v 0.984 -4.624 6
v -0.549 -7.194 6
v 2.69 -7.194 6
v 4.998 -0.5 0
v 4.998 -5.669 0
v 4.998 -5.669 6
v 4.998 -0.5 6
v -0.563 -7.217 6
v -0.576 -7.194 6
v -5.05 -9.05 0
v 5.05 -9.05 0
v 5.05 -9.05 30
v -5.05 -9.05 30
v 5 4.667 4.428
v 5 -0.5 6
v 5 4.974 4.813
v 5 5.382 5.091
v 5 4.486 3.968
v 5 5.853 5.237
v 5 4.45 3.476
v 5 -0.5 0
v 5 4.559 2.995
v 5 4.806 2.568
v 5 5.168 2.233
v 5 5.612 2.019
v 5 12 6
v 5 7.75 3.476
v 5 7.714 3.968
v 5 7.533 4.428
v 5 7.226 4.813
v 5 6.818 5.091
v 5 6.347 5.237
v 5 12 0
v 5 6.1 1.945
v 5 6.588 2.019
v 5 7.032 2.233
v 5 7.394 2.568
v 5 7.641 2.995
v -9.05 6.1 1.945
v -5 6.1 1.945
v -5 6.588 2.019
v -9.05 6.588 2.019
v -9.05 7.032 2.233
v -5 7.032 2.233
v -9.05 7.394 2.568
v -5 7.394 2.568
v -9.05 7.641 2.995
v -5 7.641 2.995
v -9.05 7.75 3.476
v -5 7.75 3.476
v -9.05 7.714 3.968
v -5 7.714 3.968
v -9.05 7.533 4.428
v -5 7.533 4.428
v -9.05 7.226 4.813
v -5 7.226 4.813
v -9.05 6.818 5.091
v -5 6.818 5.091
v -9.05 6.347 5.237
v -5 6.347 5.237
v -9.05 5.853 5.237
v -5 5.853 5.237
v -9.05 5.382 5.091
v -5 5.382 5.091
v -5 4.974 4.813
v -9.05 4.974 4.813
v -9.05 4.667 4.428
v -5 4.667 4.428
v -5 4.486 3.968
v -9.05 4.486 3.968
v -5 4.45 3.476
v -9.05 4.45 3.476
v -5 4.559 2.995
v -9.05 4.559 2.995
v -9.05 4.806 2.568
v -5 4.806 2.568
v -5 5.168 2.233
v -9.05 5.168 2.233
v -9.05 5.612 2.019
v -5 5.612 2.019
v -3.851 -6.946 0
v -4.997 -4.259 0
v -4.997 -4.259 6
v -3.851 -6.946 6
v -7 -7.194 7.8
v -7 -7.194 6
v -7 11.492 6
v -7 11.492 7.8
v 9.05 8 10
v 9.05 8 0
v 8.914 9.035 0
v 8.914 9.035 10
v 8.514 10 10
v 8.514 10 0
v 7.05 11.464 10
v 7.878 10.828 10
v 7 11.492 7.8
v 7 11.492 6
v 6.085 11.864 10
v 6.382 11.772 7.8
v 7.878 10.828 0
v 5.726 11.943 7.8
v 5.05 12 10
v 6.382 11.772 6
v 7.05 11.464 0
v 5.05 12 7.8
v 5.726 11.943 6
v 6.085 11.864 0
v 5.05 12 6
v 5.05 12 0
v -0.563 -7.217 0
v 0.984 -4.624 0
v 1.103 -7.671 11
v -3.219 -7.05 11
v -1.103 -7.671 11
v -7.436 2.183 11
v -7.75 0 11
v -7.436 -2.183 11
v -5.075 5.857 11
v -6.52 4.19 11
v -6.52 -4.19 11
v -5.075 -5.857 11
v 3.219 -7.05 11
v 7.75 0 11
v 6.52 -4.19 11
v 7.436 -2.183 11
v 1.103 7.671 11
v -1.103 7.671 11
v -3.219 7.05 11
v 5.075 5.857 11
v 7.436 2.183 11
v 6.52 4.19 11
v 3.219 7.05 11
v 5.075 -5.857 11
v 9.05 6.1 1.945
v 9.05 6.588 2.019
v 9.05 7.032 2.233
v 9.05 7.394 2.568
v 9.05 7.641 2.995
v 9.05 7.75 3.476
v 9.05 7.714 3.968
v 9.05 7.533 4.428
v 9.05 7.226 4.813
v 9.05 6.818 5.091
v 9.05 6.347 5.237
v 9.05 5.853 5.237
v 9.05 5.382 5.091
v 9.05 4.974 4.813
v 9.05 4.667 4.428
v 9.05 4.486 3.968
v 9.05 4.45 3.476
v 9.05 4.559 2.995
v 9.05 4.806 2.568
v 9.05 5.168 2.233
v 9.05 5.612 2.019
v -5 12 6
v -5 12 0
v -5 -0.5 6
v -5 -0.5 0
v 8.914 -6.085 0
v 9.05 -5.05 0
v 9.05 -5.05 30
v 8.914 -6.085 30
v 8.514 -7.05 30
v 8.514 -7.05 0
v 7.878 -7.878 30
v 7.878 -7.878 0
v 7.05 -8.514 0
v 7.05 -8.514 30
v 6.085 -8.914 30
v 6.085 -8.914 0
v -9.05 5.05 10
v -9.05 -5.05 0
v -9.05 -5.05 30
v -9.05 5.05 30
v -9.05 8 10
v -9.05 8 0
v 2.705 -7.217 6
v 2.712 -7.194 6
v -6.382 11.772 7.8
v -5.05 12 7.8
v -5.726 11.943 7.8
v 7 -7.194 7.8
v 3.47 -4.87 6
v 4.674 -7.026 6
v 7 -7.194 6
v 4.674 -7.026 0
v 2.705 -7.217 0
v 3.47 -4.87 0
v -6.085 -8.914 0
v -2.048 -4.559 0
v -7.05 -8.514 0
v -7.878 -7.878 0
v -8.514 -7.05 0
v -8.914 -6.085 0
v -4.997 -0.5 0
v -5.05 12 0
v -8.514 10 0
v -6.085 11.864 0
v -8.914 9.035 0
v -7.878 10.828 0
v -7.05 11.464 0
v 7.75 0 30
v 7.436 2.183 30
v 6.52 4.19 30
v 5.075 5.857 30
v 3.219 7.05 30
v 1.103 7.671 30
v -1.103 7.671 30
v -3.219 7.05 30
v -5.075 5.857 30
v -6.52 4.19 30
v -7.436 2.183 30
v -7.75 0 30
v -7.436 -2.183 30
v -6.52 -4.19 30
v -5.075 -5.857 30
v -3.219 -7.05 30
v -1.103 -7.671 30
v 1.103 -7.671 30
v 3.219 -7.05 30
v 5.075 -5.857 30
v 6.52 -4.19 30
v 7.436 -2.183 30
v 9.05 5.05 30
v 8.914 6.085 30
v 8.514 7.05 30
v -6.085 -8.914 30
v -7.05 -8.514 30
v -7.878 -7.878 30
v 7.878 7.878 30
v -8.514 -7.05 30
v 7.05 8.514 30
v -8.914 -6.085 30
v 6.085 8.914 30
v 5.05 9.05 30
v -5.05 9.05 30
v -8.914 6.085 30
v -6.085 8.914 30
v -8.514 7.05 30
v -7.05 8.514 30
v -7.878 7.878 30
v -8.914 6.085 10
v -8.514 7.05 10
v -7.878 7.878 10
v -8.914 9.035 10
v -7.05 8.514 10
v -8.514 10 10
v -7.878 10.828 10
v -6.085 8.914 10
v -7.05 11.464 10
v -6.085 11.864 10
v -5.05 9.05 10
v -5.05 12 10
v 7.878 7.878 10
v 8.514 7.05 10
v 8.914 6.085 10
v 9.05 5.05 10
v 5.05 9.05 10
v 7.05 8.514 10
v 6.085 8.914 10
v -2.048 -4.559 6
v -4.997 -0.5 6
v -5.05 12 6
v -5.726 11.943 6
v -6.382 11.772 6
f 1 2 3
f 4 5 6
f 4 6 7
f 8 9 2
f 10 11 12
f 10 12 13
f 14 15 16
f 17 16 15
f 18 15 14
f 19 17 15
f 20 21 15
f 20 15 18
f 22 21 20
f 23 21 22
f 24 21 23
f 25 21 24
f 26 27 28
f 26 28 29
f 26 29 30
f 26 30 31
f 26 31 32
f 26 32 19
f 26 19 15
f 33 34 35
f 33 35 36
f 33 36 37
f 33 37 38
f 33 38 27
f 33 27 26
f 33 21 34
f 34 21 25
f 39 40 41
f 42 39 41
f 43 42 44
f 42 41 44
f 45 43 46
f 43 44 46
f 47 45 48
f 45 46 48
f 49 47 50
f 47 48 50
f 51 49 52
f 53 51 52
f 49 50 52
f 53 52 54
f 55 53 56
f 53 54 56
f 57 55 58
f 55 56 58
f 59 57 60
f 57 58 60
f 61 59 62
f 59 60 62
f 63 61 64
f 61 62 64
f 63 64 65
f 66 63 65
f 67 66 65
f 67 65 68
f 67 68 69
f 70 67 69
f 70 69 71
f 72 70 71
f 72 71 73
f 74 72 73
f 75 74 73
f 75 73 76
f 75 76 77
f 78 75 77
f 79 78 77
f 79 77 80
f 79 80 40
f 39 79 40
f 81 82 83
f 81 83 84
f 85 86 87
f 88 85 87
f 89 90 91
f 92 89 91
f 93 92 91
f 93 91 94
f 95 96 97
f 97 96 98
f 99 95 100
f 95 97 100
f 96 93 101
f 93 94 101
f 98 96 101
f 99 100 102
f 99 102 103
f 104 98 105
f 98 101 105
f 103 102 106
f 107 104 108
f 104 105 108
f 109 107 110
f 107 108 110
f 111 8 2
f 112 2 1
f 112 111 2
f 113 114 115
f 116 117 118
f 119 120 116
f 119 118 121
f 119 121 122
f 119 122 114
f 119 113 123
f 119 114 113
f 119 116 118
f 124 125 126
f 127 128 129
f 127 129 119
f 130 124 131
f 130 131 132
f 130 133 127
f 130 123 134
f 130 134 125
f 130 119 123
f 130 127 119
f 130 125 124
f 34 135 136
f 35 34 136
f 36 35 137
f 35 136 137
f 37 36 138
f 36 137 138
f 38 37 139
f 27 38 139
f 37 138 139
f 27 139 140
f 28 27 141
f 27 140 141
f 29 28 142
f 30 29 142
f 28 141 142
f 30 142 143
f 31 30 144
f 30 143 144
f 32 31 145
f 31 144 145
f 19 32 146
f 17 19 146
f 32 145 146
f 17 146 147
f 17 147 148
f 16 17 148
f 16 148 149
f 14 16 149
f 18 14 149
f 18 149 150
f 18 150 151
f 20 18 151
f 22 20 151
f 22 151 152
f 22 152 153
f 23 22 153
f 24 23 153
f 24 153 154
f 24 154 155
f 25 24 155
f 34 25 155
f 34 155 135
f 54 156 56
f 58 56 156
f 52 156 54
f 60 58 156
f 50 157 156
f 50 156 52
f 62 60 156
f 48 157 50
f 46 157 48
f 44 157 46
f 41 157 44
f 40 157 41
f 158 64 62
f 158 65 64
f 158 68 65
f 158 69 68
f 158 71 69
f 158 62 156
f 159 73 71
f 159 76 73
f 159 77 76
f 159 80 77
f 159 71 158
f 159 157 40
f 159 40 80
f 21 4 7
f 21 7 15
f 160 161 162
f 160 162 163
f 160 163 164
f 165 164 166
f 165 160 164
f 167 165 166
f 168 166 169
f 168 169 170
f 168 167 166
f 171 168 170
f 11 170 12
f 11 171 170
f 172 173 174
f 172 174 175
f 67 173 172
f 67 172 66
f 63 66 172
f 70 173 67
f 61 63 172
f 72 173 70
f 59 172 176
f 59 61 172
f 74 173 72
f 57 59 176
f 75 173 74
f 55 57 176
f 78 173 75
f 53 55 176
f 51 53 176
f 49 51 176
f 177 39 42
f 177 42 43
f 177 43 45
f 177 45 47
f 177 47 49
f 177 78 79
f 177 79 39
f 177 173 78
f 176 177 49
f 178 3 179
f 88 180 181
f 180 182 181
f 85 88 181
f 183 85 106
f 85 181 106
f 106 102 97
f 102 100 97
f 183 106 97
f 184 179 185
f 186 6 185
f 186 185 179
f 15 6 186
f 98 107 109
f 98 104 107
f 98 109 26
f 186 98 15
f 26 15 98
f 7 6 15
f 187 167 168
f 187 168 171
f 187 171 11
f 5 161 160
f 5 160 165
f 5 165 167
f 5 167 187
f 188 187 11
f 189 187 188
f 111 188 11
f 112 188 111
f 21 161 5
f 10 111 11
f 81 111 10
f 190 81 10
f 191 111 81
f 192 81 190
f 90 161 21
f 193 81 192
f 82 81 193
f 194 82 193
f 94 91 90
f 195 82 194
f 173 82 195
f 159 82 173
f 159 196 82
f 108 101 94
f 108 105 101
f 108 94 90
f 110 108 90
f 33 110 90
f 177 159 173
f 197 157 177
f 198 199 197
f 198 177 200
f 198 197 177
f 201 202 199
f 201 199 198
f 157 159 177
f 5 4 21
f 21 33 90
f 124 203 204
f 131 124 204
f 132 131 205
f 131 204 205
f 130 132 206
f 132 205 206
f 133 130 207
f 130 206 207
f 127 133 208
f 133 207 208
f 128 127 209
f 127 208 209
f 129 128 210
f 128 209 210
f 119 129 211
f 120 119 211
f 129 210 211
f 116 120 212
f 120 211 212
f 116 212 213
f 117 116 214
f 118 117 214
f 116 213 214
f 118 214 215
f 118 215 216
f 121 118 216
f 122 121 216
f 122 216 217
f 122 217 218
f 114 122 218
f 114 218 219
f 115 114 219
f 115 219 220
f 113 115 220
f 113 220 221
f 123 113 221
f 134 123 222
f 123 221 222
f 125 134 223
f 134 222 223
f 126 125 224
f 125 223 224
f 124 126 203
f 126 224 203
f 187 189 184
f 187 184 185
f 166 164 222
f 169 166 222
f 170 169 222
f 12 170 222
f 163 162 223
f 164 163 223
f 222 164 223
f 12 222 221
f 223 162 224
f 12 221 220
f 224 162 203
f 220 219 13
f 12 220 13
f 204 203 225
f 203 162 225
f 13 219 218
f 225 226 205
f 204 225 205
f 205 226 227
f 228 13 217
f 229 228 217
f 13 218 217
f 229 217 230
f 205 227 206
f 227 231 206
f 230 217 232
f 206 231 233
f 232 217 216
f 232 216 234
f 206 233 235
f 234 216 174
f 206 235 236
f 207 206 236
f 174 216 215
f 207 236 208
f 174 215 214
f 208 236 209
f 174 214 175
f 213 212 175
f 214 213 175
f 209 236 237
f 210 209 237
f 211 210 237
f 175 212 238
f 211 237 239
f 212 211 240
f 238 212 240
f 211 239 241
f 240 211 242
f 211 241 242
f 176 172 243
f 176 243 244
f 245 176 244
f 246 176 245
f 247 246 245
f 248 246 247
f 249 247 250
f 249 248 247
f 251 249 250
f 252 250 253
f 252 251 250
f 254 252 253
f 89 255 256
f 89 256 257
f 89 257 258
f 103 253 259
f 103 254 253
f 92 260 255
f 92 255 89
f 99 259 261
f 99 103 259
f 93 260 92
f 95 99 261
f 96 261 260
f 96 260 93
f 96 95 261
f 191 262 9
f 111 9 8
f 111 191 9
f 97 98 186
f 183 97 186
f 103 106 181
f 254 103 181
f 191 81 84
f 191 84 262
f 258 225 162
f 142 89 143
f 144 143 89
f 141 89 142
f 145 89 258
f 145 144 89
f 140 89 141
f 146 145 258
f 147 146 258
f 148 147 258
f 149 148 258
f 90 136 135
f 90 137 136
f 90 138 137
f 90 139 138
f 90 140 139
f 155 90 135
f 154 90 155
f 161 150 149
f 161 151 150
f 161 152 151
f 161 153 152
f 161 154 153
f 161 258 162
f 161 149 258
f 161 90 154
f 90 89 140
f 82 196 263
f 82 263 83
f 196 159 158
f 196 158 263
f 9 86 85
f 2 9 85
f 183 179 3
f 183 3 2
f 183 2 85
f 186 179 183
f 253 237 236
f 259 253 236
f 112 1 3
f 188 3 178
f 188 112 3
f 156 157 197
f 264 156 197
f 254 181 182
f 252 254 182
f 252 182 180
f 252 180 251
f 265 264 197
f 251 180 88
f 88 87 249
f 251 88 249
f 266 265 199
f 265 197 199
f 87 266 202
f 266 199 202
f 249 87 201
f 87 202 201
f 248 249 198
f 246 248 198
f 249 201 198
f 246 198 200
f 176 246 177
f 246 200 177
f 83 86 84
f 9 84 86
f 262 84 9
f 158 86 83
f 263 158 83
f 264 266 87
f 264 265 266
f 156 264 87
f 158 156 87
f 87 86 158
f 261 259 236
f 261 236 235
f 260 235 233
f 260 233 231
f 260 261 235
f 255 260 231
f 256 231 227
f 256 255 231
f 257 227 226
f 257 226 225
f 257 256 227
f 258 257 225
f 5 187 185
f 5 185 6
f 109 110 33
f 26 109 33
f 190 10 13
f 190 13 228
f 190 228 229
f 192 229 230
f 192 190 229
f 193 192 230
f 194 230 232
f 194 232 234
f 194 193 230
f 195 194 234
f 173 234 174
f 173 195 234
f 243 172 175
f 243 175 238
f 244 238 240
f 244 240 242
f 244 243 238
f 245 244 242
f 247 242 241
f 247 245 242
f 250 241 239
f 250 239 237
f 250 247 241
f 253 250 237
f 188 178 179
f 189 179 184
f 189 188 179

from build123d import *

# Parameters (mm, degrees)
BOSS_EXTRUDE1_DEPTH = 30
BOSS_EXTRUDE3_DEPTH = 10
SKETCH17_R          = 1.655
CUT_EXTRUDE10_DEPTH = 30
CUT_EXTRUDE11_DEPTH = 6
CUT_EXTRUDE12_DEPTH = 1.8
CUT_EXTRUDE13_DEPTH = 7.2
SKETCH24_R          = 7.75
CUT_EXTRUDE15_DEPTH = 19


with BuildPart() as part:
    # Sketch1 → Boss-Extrude1 (new body)
    with BuildSketch(Plane.XY):
        with BuildLine():
            Line((-5.05, 9.05), (5.05, 9.05))
            ThreePointArc((5.05, 9.05), (7.878427125, 7.878427125), (9.05, 5.05))
            Line((9.05, 5.05), (9.05, -5.05))
            ThreePointArc((9.05, -5.05), (7.878427125, -7.878427125), (5.05, -9.05))
            Line((5.05, -9.05), (-5.05, -9.05))
            ThreePointArc((-5.05, -9.05), (-7.878427125, -7.878427125), (-9.05, -5.05))
            Line((-9.05, -5.05), (-9.05, 5.05))
            ThreePointArc((-9.05, 5.05), (-7.878427125, 7.878427125), (-5.05, 9.05))
        make_face()
    extrude(amount=BOSS_EXTRUDE1_DEPTH)

    # Sketch15 → Boss-Extrude3 (add)
    with BuildSketch(Plane.XY):
        with BuildLine():
            Line((-5.05, -9.05), (5.05, -9.05))
            ThreePointArc((5.05, -9.05), (7.878427125, -7.878427125), (9.05, -5.05))
            Line((9.05, -5.05), (9.05, 8))
            ThreePointArc((9.05, 8), (7.878427125, 10.828427125), (5.05, 12))
            Line((5.05, 12), (-5.05, 12))
            ThreePointArc((-5.05, 12), (-7.878427125, 10.828427125), (-9.05, 8))
            Line((-9.05, 8), (-9.05, -5.05))
            ThreePointArc((-9.05, -5.05), (-7.878427125, -7.878427125), (-5.05, -9.05))
        make_face()
    extrude(amount=BOSS_EXTRUDE3_DEPTH)

    # Sketch17 → Cut-Extrude10 (cut)
    with BuildSketch(Plane(origin=(9.05, 0, 0), x_dir=(0, 0, -1), z_dir=(1, 0, 0))):
        with Locations((-3.6, 6.1)):
            Circle(SKETCH17_R)
    extrude(amount=-CUT_EXTRUDE10_DEPTH, mode=Mode.SUBTRACT)

    # Sketch18 → Cut-Extrude11 (cut)
    with BuildSketch(Plane.XY):
        Polygon((-4.996539756, -4.259182236), (-3.851088562, -6.946129507), (-2.048481088, -4.559068161), (-0.563070773, -7.21717083), (0.983895836, -4.624244345), (2.704822485, -7.21717083), (3.469678774, -4.870091009), (4.674482161, -7.026054964), (4.998172504, -5.668676456), (4.998172504, 5.373520003), (-4.996539756, 5.373520003), align=None)
    extrude(amount=CUT_EXTRUDE11_DEPTH, mode=Mode.SUBTRACT)

    # Sketch20 → Cut-Extrude12 (cut)
    with BuildSketch(Plane(origin=(0, 0, 6), x_dir=(-1, 0, 0), z_dir=(0, 0, -1))):
        Polygon((-7, 0), (-7, 13.473809321), (7, 13.473809321), (7, 0), (7, -7.194424303), (-7, -7.194424303), align=None)
    extrude(amount=-CUT_EXTRUDE12_DEPTH, mode=Mode.SUBTRACT)

    # Sketch21 → Cut-Extrude13 (cut)
    with BuildSketch(Plane.XY):
        Polygon((5, 17.493725323), (-5, 17.493725323), (-5, 0), (-5, -0.5), (5, -0.5), (5, 0), align=None)
    extrude(amount=CUT_EXTRUDE13_DEPTH, mode=Mode.SUBTRACT)

    # Sketch24 → Cut-Extrude15 (cut)
    with BuildSketch(Plane.XY.offset(30)):
        Circle(SKETCH24_R)
    extrude(amount=-CUT_EXTRUDE15_DEPTH, mode=Mode.SUBTRACT)


solid = part.part
